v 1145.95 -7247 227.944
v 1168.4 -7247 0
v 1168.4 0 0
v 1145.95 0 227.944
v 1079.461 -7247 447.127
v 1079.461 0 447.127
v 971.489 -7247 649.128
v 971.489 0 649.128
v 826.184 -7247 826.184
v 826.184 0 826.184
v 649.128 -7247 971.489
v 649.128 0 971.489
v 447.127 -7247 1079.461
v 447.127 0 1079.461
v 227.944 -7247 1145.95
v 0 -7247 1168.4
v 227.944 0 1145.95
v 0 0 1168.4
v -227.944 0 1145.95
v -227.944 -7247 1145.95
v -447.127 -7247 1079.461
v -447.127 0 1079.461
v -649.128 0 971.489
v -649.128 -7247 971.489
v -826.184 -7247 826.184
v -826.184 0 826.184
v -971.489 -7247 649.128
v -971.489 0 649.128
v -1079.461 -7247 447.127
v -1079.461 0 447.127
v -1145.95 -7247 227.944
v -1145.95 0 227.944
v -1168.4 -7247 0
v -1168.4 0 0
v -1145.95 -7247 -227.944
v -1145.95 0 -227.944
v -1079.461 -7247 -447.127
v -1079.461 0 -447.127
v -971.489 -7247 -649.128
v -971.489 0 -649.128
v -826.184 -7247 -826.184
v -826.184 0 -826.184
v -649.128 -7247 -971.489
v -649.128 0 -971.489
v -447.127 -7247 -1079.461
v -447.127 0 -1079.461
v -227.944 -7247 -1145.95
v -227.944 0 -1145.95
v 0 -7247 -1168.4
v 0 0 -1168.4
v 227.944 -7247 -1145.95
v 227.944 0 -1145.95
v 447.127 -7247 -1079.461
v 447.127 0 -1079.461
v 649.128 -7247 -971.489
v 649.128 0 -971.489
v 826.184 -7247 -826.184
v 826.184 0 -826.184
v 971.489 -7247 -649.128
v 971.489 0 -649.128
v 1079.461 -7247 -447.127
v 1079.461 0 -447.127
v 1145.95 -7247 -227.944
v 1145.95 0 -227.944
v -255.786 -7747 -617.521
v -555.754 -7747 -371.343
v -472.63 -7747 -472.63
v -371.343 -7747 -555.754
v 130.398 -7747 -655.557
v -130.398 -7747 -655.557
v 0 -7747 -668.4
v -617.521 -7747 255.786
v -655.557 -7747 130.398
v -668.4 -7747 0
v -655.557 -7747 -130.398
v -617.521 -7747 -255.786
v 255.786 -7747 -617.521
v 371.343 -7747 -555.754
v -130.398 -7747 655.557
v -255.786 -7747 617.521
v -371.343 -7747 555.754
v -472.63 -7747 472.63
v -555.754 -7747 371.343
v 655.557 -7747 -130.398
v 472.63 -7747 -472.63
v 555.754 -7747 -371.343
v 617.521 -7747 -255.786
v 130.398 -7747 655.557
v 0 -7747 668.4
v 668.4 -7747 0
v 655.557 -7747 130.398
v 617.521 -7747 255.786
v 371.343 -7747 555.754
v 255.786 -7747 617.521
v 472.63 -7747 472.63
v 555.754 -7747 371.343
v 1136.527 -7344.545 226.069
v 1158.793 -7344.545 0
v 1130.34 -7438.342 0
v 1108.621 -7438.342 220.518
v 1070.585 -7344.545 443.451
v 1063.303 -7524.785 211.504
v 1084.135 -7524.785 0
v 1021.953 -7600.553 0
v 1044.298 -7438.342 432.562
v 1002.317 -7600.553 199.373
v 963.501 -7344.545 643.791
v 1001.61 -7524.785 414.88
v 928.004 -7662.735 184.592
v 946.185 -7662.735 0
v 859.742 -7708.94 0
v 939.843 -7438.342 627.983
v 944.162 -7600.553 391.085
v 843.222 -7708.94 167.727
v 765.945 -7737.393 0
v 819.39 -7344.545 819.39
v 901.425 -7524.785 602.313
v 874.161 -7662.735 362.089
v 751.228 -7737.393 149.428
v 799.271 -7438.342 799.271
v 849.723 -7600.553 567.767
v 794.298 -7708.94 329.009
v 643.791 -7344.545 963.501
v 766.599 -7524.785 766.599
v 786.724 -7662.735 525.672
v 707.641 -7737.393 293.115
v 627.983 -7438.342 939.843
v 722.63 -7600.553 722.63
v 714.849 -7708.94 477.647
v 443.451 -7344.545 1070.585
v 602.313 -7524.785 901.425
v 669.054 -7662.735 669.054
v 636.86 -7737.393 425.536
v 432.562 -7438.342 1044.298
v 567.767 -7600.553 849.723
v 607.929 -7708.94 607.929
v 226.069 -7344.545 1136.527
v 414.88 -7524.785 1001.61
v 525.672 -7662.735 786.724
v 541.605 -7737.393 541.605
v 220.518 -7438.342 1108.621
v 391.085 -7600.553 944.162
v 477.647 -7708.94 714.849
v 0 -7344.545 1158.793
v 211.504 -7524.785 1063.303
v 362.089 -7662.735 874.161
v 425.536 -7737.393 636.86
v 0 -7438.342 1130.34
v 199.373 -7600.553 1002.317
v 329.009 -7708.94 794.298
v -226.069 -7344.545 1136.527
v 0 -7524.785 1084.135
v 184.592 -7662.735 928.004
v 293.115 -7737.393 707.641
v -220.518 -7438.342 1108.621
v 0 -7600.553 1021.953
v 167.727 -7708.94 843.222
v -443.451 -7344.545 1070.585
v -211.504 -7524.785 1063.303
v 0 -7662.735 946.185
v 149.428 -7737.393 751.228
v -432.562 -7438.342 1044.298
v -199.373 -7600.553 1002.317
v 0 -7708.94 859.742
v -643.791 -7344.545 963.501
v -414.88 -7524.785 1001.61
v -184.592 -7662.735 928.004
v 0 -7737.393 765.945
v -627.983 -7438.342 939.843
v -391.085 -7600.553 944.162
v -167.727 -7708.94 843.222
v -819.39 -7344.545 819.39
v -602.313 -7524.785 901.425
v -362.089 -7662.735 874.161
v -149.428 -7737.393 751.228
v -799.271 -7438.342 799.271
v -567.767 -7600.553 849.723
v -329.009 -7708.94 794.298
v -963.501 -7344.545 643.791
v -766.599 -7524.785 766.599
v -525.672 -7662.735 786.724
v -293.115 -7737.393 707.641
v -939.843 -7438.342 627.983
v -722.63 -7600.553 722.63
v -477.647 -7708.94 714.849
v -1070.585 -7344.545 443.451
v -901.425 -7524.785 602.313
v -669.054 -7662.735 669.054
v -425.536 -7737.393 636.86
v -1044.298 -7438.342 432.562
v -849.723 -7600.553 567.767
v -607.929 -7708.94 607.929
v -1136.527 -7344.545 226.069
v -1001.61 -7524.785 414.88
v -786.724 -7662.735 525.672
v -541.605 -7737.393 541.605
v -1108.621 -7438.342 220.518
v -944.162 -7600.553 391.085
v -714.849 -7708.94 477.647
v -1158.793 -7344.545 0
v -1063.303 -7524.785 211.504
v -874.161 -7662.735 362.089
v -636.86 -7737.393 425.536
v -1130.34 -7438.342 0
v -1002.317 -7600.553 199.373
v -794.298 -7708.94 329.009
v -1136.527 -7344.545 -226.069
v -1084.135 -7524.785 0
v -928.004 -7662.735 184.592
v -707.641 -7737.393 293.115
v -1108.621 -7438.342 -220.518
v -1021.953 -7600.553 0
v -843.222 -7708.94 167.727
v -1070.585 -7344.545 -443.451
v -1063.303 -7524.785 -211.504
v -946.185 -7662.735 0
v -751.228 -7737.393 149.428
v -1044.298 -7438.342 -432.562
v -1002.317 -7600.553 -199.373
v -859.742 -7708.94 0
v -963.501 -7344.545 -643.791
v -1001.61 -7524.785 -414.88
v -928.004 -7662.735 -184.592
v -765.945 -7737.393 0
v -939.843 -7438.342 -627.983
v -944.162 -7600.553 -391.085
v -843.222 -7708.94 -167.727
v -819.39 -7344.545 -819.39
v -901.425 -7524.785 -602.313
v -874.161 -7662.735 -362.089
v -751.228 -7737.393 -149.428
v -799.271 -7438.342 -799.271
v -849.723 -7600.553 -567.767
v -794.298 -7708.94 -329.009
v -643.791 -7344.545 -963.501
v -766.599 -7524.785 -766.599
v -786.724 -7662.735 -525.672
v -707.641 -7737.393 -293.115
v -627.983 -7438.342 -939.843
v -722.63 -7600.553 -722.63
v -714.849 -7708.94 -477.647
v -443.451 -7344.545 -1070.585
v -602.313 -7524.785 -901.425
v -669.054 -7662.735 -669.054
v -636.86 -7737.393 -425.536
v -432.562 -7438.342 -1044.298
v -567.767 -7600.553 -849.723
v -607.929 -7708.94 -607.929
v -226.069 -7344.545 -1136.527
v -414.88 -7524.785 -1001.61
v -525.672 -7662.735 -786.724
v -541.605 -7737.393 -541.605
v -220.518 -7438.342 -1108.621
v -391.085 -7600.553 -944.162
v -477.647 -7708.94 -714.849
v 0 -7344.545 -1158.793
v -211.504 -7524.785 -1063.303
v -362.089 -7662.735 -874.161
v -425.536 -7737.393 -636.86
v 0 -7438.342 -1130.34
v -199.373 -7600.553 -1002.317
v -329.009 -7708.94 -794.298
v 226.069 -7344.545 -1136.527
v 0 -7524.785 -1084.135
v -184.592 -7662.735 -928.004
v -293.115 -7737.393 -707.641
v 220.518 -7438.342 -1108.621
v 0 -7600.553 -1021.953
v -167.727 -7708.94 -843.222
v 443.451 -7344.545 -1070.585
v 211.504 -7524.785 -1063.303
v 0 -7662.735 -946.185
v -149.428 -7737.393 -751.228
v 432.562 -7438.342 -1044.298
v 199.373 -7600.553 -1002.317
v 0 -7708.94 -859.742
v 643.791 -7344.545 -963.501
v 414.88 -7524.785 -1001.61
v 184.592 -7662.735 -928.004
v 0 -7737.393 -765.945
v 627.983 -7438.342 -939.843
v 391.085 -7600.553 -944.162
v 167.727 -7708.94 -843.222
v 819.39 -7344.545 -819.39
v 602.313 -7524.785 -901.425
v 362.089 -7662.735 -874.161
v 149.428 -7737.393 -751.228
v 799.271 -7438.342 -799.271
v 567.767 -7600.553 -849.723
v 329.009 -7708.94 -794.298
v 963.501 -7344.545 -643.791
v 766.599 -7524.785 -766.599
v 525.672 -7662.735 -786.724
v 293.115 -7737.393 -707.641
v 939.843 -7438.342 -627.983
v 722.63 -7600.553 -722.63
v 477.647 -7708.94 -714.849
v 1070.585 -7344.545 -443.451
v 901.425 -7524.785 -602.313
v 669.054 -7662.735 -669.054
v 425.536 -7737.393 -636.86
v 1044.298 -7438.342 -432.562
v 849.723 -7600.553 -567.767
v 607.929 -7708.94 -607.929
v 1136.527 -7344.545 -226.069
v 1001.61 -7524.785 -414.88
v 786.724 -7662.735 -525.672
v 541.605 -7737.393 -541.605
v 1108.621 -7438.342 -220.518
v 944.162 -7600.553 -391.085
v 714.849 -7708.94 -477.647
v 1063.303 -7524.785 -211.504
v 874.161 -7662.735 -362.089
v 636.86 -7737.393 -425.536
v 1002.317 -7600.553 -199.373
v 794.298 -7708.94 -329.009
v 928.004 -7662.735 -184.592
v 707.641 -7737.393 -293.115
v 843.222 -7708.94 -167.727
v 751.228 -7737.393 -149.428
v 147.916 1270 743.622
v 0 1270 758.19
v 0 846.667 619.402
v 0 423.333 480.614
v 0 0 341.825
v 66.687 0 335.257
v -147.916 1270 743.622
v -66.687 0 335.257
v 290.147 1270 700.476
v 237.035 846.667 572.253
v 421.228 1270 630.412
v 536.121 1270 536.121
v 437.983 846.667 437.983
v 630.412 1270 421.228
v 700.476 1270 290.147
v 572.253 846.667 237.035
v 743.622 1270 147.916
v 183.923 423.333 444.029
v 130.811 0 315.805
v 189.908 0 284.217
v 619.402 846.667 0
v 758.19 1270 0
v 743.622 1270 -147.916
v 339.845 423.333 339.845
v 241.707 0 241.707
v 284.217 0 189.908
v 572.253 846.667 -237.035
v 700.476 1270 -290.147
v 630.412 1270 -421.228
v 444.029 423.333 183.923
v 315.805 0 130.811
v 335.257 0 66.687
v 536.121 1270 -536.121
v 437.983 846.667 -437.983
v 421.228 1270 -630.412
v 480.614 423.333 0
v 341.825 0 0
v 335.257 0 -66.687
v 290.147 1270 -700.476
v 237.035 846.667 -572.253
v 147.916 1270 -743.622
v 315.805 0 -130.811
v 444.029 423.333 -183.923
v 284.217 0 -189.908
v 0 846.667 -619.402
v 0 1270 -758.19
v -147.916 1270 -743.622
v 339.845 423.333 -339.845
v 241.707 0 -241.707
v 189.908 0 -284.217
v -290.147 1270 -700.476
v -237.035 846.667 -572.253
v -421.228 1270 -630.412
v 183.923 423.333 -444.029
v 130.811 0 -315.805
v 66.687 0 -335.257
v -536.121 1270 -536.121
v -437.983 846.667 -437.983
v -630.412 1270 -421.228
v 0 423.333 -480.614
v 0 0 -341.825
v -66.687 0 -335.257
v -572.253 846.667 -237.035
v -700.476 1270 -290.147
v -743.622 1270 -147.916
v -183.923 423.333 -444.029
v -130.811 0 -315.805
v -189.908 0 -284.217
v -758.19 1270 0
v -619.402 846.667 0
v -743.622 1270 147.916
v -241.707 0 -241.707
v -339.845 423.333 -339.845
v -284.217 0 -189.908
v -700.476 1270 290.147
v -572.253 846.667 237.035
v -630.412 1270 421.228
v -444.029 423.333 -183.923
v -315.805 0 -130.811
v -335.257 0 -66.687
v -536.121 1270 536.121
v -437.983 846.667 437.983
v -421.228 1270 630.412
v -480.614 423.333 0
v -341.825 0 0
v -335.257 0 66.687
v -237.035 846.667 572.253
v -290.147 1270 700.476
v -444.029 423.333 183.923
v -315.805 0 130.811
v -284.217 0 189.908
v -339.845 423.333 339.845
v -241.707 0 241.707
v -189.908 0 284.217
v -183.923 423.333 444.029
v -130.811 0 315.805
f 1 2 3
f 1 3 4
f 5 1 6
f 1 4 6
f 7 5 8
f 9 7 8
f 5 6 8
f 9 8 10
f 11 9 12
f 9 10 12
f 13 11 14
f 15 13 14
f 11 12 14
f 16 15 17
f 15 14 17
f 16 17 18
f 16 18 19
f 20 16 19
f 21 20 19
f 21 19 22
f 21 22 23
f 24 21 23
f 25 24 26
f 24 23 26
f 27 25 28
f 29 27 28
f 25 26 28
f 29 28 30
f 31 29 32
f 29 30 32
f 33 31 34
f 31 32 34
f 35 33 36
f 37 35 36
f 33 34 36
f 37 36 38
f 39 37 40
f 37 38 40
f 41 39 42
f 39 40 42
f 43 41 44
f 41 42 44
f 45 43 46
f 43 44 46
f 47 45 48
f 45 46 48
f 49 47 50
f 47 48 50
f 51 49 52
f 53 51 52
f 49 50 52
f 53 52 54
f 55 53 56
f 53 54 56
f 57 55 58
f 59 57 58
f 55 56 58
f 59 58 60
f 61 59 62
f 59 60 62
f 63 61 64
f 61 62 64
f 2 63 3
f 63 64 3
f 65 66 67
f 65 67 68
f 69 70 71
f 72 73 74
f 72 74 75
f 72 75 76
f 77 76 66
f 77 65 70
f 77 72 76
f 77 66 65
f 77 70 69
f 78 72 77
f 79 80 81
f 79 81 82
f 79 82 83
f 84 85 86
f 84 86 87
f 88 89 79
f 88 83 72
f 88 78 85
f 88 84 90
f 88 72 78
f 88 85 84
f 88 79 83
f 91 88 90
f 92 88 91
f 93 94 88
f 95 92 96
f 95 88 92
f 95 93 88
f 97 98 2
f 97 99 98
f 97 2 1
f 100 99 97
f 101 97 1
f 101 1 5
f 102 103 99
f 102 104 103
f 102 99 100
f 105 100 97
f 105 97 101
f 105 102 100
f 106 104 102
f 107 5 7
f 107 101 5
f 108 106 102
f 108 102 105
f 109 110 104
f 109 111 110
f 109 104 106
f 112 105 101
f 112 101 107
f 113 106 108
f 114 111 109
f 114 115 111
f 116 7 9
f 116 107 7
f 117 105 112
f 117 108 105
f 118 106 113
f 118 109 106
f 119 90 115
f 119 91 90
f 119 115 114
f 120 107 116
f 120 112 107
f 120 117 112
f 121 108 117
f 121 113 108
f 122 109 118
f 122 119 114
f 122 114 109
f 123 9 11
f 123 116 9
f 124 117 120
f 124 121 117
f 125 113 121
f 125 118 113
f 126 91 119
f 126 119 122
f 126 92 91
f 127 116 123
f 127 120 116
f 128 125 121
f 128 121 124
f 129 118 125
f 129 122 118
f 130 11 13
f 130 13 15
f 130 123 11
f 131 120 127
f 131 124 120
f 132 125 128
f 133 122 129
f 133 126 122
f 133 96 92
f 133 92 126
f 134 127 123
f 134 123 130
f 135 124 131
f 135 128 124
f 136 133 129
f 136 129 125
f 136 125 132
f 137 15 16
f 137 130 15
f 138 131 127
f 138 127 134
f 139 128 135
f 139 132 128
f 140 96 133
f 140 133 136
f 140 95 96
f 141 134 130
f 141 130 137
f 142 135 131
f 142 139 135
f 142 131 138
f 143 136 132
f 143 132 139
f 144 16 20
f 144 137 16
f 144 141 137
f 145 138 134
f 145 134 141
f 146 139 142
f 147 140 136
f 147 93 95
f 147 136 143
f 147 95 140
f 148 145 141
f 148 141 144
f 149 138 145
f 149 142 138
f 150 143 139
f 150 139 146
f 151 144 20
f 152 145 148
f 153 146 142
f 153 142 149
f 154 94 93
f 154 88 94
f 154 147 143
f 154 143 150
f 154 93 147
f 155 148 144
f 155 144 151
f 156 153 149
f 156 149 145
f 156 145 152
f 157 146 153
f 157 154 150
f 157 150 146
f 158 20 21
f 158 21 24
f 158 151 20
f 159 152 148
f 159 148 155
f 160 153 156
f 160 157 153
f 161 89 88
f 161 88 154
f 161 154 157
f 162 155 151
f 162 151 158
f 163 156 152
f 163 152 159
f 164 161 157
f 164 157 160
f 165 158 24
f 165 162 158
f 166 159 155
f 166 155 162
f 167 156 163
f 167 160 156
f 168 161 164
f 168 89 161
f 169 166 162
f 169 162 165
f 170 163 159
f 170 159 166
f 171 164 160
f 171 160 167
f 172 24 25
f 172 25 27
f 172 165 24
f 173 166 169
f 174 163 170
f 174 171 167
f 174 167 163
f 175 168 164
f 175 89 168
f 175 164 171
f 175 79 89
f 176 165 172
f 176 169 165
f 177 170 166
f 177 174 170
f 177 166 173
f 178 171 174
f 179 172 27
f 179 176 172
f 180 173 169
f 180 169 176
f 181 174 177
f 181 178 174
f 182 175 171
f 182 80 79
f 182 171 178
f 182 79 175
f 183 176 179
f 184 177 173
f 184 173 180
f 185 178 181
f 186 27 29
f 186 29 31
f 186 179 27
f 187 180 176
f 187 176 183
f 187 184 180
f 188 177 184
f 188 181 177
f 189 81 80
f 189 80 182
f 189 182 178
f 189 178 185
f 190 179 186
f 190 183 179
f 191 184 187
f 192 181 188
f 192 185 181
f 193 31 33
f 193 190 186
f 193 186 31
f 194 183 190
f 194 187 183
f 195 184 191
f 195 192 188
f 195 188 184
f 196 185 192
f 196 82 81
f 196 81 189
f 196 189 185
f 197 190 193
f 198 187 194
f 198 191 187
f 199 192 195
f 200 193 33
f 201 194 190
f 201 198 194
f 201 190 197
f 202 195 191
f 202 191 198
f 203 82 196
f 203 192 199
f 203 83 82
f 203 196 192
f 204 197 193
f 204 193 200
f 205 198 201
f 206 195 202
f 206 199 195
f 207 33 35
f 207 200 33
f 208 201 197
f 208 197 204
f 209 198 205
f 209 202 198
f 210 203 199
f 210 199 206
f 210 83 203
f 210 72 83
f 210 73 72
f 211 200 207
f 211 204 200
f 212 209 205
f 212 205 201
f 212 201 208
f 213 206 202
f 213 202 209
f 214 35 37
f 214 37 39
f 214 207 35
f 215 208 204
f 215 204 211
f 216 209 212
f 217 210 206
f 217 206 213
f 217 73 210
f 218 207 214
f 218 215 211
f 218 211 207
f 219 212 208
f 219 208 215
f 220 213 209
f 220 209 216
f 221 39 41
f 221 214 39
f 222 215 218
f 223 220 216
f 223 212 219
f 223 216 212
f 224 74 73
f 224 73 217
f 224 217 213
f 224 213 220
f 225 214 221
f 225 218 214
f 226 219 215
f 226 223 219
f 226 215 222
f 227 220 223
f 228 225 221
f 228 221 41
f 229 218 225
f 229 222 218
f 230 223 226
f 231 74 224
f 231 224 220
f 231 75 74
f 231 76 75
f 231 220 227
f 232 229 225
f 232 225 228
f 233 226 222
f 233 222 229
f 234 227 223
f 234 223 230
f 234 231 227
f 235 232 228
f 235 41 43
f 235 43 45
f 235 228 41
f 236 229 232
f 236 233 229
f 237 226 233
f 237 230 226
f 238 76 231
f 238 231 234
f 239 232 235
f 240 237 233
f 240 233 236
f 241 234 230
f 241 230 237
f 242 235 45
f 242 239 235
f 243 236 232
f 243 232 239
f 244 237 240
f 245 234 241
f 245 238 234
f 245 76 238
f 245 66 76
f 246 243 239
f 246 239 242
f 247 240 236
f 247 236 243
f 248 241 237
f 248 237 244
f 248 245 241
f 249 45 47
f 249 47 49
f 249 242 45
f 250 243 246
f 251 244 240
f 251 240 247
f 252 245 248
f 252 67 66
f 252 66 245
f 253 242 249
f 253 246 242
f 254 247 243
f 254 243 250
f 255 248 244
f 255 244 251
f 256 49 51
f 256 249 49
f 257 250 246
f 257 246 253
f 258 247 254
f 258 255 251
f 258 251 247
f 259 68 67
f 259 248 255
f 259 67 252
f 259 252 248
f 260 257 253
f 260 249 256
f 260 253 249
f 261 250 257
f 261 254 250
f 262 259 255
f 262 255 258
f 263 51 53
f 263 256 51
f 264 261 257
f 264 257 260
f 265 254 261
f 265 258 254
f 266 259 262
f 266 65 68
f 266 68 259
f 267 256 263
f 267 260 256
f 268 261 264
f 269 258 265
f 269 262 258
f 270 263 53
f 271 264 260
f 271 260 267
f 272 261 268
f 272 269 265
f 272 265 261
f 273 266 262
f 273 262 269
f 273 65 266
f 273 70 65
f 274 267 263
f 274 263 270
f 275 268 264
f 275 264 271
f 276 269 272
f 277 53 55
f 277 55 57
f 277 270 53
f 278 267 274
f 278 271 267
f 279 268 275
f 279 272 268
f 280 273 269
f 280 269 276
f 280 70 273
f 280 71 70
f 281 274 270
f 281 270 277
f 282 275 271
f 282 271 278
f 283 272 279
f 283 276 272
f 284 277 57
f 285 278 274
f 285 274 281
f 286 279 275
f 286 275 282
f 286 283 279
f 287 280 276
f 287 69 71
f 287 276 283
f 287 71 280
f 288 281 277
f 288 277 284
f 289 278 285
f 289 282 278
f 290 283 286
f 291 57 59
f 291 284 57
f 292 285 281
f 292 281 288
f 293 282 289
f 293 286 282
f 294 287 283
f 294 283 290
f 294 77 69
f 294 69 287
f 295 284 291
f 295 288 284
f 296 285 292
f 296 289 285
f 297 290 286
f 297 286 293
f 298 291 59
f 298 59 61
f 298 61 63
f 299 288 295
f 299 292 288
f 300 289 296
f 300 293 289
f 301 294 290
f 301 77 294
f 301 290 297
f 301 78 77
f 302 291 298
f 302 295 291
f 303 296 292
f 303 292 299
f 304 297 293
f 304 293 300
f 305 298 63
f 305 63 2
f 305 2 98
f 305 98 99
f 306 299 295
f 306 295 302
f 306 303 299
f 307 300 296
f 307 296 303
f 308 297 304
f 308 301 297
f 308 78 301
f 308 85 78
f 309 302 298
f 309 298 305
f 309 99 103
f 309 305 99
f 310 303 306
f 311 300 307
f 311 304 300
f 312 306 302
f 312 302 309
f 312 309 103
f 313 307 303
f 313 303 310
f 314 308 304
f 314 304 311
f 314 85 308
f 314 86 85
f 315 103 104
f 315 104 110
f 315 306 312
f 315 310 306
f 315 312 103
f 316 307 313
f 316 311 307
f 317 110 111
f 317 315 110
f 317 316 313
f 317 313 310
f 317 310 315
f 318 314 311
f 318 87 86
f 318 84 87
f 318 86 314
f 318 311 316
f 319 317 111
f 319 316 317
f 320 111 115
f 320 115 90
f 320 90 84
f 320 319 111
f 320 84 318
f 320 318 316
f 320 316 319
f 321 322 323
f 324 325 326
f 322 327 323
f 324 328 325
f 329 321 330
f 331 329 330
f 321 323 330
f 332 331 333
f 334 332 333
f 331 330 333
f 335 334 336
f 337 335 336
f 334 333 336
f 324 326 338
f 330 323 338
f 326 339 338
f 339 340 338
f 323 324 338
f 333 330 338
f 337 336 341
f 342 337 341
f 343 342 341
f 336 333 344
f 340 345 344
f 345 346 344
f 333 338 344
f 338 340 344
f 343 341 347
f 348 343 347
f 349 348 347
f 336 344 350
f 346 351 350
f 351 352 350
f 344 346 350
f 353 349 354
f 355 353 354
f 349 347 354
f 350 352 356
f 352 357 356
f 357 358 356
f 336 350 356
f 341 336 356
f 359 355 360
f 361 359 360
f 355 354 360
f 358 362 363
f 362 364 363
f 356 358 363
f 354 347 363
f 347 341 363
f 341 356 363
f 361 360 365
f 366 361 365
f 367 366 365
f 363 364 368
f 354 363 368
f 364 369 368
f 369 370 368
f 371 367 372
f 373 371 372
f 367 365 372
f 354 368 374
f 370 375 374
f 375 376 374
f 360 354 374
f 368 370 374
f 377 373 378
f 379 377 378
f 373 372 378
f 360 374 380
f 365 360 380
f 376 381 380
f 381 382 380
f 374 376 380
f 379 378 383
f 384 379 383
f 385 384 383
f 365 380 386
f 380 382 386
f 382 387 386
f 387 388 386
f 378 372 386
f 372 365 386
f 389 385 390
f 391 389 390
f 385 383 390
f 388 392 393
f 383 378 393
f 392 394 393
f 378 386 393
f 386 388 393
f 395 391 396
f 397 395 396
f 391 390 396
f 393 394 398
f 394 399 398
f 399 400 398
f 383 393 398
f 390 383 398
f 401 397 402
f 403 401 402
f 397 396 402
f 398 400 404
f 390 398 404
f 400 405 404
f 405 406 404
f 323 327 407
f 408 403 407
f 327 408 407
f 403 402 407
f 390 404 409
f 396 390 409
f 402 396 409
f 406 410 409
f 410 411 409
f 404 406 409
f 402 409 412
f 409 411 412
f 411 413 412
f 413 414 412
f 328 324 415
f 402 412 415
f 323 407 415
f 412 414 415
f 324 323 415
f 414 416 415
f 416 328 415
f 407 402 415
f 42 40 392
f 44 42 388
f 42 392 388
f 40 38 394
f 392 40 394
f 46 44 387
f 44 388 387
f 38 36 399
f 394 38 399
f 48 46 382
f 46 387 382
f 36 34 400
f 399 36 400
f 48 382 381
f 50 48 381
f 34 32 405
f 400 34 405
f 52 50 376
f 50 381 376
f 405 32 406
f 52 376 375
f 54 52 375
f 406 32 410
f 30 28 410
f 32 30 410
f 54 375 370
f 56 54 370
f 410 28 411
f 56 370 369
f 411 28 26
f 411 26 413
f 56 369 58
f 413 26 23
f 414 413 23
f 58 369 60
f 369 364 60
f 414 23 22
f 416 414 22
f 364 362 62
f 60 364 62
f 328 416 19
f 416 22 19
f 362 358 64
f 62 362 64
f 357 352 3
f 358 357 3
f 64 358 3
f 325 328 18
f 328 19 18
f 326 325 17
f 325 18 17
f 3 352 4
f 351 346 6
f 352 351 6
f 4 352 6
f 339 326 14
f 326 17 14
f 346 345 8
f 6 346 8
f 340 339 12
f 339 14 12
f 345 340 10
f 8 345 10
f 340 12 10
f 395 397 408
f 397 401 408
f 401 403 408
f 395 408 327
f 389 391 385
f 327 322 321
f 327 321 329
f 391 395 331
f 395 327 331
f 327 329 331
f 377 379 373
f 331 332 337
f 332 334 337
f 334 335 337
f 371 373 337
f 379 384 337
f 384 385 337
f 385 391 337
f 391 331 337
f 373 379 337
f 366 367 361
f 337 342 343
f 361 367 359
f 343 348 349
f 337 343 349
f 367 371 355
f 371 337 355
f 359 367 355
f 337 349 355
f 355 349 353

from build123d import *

# Parameters (mm, degrees)
F0_R     = 1168.4
F1_DEPTH = 7747
F4_R     = 500


with BuildPart() as f1:
    # F0 (on Front) → F1 (new body)
    with BuildSketch(Plane.XZ):
        Circle(F0_R)
    extrude(amount=F1_DEPTH)

    # F2 (on Right) → F3 (revolve)
    with BuildSketch(Plane.YZ):
        Polygon((0, 341.825306), (0, 0), (1270, 0), (1270, 758.19), align=None)
    revolve(axis=Axis((0, 635, 0), (0, 1, 0)))

    # F4
    f4_edges = [f1.edges().sort_by_distance(p)[0] for p in [
        (-1168.4, -7747, 0),
    ]]
    fillet(f4_edges, radius=F4_R)


solid = f1.part
